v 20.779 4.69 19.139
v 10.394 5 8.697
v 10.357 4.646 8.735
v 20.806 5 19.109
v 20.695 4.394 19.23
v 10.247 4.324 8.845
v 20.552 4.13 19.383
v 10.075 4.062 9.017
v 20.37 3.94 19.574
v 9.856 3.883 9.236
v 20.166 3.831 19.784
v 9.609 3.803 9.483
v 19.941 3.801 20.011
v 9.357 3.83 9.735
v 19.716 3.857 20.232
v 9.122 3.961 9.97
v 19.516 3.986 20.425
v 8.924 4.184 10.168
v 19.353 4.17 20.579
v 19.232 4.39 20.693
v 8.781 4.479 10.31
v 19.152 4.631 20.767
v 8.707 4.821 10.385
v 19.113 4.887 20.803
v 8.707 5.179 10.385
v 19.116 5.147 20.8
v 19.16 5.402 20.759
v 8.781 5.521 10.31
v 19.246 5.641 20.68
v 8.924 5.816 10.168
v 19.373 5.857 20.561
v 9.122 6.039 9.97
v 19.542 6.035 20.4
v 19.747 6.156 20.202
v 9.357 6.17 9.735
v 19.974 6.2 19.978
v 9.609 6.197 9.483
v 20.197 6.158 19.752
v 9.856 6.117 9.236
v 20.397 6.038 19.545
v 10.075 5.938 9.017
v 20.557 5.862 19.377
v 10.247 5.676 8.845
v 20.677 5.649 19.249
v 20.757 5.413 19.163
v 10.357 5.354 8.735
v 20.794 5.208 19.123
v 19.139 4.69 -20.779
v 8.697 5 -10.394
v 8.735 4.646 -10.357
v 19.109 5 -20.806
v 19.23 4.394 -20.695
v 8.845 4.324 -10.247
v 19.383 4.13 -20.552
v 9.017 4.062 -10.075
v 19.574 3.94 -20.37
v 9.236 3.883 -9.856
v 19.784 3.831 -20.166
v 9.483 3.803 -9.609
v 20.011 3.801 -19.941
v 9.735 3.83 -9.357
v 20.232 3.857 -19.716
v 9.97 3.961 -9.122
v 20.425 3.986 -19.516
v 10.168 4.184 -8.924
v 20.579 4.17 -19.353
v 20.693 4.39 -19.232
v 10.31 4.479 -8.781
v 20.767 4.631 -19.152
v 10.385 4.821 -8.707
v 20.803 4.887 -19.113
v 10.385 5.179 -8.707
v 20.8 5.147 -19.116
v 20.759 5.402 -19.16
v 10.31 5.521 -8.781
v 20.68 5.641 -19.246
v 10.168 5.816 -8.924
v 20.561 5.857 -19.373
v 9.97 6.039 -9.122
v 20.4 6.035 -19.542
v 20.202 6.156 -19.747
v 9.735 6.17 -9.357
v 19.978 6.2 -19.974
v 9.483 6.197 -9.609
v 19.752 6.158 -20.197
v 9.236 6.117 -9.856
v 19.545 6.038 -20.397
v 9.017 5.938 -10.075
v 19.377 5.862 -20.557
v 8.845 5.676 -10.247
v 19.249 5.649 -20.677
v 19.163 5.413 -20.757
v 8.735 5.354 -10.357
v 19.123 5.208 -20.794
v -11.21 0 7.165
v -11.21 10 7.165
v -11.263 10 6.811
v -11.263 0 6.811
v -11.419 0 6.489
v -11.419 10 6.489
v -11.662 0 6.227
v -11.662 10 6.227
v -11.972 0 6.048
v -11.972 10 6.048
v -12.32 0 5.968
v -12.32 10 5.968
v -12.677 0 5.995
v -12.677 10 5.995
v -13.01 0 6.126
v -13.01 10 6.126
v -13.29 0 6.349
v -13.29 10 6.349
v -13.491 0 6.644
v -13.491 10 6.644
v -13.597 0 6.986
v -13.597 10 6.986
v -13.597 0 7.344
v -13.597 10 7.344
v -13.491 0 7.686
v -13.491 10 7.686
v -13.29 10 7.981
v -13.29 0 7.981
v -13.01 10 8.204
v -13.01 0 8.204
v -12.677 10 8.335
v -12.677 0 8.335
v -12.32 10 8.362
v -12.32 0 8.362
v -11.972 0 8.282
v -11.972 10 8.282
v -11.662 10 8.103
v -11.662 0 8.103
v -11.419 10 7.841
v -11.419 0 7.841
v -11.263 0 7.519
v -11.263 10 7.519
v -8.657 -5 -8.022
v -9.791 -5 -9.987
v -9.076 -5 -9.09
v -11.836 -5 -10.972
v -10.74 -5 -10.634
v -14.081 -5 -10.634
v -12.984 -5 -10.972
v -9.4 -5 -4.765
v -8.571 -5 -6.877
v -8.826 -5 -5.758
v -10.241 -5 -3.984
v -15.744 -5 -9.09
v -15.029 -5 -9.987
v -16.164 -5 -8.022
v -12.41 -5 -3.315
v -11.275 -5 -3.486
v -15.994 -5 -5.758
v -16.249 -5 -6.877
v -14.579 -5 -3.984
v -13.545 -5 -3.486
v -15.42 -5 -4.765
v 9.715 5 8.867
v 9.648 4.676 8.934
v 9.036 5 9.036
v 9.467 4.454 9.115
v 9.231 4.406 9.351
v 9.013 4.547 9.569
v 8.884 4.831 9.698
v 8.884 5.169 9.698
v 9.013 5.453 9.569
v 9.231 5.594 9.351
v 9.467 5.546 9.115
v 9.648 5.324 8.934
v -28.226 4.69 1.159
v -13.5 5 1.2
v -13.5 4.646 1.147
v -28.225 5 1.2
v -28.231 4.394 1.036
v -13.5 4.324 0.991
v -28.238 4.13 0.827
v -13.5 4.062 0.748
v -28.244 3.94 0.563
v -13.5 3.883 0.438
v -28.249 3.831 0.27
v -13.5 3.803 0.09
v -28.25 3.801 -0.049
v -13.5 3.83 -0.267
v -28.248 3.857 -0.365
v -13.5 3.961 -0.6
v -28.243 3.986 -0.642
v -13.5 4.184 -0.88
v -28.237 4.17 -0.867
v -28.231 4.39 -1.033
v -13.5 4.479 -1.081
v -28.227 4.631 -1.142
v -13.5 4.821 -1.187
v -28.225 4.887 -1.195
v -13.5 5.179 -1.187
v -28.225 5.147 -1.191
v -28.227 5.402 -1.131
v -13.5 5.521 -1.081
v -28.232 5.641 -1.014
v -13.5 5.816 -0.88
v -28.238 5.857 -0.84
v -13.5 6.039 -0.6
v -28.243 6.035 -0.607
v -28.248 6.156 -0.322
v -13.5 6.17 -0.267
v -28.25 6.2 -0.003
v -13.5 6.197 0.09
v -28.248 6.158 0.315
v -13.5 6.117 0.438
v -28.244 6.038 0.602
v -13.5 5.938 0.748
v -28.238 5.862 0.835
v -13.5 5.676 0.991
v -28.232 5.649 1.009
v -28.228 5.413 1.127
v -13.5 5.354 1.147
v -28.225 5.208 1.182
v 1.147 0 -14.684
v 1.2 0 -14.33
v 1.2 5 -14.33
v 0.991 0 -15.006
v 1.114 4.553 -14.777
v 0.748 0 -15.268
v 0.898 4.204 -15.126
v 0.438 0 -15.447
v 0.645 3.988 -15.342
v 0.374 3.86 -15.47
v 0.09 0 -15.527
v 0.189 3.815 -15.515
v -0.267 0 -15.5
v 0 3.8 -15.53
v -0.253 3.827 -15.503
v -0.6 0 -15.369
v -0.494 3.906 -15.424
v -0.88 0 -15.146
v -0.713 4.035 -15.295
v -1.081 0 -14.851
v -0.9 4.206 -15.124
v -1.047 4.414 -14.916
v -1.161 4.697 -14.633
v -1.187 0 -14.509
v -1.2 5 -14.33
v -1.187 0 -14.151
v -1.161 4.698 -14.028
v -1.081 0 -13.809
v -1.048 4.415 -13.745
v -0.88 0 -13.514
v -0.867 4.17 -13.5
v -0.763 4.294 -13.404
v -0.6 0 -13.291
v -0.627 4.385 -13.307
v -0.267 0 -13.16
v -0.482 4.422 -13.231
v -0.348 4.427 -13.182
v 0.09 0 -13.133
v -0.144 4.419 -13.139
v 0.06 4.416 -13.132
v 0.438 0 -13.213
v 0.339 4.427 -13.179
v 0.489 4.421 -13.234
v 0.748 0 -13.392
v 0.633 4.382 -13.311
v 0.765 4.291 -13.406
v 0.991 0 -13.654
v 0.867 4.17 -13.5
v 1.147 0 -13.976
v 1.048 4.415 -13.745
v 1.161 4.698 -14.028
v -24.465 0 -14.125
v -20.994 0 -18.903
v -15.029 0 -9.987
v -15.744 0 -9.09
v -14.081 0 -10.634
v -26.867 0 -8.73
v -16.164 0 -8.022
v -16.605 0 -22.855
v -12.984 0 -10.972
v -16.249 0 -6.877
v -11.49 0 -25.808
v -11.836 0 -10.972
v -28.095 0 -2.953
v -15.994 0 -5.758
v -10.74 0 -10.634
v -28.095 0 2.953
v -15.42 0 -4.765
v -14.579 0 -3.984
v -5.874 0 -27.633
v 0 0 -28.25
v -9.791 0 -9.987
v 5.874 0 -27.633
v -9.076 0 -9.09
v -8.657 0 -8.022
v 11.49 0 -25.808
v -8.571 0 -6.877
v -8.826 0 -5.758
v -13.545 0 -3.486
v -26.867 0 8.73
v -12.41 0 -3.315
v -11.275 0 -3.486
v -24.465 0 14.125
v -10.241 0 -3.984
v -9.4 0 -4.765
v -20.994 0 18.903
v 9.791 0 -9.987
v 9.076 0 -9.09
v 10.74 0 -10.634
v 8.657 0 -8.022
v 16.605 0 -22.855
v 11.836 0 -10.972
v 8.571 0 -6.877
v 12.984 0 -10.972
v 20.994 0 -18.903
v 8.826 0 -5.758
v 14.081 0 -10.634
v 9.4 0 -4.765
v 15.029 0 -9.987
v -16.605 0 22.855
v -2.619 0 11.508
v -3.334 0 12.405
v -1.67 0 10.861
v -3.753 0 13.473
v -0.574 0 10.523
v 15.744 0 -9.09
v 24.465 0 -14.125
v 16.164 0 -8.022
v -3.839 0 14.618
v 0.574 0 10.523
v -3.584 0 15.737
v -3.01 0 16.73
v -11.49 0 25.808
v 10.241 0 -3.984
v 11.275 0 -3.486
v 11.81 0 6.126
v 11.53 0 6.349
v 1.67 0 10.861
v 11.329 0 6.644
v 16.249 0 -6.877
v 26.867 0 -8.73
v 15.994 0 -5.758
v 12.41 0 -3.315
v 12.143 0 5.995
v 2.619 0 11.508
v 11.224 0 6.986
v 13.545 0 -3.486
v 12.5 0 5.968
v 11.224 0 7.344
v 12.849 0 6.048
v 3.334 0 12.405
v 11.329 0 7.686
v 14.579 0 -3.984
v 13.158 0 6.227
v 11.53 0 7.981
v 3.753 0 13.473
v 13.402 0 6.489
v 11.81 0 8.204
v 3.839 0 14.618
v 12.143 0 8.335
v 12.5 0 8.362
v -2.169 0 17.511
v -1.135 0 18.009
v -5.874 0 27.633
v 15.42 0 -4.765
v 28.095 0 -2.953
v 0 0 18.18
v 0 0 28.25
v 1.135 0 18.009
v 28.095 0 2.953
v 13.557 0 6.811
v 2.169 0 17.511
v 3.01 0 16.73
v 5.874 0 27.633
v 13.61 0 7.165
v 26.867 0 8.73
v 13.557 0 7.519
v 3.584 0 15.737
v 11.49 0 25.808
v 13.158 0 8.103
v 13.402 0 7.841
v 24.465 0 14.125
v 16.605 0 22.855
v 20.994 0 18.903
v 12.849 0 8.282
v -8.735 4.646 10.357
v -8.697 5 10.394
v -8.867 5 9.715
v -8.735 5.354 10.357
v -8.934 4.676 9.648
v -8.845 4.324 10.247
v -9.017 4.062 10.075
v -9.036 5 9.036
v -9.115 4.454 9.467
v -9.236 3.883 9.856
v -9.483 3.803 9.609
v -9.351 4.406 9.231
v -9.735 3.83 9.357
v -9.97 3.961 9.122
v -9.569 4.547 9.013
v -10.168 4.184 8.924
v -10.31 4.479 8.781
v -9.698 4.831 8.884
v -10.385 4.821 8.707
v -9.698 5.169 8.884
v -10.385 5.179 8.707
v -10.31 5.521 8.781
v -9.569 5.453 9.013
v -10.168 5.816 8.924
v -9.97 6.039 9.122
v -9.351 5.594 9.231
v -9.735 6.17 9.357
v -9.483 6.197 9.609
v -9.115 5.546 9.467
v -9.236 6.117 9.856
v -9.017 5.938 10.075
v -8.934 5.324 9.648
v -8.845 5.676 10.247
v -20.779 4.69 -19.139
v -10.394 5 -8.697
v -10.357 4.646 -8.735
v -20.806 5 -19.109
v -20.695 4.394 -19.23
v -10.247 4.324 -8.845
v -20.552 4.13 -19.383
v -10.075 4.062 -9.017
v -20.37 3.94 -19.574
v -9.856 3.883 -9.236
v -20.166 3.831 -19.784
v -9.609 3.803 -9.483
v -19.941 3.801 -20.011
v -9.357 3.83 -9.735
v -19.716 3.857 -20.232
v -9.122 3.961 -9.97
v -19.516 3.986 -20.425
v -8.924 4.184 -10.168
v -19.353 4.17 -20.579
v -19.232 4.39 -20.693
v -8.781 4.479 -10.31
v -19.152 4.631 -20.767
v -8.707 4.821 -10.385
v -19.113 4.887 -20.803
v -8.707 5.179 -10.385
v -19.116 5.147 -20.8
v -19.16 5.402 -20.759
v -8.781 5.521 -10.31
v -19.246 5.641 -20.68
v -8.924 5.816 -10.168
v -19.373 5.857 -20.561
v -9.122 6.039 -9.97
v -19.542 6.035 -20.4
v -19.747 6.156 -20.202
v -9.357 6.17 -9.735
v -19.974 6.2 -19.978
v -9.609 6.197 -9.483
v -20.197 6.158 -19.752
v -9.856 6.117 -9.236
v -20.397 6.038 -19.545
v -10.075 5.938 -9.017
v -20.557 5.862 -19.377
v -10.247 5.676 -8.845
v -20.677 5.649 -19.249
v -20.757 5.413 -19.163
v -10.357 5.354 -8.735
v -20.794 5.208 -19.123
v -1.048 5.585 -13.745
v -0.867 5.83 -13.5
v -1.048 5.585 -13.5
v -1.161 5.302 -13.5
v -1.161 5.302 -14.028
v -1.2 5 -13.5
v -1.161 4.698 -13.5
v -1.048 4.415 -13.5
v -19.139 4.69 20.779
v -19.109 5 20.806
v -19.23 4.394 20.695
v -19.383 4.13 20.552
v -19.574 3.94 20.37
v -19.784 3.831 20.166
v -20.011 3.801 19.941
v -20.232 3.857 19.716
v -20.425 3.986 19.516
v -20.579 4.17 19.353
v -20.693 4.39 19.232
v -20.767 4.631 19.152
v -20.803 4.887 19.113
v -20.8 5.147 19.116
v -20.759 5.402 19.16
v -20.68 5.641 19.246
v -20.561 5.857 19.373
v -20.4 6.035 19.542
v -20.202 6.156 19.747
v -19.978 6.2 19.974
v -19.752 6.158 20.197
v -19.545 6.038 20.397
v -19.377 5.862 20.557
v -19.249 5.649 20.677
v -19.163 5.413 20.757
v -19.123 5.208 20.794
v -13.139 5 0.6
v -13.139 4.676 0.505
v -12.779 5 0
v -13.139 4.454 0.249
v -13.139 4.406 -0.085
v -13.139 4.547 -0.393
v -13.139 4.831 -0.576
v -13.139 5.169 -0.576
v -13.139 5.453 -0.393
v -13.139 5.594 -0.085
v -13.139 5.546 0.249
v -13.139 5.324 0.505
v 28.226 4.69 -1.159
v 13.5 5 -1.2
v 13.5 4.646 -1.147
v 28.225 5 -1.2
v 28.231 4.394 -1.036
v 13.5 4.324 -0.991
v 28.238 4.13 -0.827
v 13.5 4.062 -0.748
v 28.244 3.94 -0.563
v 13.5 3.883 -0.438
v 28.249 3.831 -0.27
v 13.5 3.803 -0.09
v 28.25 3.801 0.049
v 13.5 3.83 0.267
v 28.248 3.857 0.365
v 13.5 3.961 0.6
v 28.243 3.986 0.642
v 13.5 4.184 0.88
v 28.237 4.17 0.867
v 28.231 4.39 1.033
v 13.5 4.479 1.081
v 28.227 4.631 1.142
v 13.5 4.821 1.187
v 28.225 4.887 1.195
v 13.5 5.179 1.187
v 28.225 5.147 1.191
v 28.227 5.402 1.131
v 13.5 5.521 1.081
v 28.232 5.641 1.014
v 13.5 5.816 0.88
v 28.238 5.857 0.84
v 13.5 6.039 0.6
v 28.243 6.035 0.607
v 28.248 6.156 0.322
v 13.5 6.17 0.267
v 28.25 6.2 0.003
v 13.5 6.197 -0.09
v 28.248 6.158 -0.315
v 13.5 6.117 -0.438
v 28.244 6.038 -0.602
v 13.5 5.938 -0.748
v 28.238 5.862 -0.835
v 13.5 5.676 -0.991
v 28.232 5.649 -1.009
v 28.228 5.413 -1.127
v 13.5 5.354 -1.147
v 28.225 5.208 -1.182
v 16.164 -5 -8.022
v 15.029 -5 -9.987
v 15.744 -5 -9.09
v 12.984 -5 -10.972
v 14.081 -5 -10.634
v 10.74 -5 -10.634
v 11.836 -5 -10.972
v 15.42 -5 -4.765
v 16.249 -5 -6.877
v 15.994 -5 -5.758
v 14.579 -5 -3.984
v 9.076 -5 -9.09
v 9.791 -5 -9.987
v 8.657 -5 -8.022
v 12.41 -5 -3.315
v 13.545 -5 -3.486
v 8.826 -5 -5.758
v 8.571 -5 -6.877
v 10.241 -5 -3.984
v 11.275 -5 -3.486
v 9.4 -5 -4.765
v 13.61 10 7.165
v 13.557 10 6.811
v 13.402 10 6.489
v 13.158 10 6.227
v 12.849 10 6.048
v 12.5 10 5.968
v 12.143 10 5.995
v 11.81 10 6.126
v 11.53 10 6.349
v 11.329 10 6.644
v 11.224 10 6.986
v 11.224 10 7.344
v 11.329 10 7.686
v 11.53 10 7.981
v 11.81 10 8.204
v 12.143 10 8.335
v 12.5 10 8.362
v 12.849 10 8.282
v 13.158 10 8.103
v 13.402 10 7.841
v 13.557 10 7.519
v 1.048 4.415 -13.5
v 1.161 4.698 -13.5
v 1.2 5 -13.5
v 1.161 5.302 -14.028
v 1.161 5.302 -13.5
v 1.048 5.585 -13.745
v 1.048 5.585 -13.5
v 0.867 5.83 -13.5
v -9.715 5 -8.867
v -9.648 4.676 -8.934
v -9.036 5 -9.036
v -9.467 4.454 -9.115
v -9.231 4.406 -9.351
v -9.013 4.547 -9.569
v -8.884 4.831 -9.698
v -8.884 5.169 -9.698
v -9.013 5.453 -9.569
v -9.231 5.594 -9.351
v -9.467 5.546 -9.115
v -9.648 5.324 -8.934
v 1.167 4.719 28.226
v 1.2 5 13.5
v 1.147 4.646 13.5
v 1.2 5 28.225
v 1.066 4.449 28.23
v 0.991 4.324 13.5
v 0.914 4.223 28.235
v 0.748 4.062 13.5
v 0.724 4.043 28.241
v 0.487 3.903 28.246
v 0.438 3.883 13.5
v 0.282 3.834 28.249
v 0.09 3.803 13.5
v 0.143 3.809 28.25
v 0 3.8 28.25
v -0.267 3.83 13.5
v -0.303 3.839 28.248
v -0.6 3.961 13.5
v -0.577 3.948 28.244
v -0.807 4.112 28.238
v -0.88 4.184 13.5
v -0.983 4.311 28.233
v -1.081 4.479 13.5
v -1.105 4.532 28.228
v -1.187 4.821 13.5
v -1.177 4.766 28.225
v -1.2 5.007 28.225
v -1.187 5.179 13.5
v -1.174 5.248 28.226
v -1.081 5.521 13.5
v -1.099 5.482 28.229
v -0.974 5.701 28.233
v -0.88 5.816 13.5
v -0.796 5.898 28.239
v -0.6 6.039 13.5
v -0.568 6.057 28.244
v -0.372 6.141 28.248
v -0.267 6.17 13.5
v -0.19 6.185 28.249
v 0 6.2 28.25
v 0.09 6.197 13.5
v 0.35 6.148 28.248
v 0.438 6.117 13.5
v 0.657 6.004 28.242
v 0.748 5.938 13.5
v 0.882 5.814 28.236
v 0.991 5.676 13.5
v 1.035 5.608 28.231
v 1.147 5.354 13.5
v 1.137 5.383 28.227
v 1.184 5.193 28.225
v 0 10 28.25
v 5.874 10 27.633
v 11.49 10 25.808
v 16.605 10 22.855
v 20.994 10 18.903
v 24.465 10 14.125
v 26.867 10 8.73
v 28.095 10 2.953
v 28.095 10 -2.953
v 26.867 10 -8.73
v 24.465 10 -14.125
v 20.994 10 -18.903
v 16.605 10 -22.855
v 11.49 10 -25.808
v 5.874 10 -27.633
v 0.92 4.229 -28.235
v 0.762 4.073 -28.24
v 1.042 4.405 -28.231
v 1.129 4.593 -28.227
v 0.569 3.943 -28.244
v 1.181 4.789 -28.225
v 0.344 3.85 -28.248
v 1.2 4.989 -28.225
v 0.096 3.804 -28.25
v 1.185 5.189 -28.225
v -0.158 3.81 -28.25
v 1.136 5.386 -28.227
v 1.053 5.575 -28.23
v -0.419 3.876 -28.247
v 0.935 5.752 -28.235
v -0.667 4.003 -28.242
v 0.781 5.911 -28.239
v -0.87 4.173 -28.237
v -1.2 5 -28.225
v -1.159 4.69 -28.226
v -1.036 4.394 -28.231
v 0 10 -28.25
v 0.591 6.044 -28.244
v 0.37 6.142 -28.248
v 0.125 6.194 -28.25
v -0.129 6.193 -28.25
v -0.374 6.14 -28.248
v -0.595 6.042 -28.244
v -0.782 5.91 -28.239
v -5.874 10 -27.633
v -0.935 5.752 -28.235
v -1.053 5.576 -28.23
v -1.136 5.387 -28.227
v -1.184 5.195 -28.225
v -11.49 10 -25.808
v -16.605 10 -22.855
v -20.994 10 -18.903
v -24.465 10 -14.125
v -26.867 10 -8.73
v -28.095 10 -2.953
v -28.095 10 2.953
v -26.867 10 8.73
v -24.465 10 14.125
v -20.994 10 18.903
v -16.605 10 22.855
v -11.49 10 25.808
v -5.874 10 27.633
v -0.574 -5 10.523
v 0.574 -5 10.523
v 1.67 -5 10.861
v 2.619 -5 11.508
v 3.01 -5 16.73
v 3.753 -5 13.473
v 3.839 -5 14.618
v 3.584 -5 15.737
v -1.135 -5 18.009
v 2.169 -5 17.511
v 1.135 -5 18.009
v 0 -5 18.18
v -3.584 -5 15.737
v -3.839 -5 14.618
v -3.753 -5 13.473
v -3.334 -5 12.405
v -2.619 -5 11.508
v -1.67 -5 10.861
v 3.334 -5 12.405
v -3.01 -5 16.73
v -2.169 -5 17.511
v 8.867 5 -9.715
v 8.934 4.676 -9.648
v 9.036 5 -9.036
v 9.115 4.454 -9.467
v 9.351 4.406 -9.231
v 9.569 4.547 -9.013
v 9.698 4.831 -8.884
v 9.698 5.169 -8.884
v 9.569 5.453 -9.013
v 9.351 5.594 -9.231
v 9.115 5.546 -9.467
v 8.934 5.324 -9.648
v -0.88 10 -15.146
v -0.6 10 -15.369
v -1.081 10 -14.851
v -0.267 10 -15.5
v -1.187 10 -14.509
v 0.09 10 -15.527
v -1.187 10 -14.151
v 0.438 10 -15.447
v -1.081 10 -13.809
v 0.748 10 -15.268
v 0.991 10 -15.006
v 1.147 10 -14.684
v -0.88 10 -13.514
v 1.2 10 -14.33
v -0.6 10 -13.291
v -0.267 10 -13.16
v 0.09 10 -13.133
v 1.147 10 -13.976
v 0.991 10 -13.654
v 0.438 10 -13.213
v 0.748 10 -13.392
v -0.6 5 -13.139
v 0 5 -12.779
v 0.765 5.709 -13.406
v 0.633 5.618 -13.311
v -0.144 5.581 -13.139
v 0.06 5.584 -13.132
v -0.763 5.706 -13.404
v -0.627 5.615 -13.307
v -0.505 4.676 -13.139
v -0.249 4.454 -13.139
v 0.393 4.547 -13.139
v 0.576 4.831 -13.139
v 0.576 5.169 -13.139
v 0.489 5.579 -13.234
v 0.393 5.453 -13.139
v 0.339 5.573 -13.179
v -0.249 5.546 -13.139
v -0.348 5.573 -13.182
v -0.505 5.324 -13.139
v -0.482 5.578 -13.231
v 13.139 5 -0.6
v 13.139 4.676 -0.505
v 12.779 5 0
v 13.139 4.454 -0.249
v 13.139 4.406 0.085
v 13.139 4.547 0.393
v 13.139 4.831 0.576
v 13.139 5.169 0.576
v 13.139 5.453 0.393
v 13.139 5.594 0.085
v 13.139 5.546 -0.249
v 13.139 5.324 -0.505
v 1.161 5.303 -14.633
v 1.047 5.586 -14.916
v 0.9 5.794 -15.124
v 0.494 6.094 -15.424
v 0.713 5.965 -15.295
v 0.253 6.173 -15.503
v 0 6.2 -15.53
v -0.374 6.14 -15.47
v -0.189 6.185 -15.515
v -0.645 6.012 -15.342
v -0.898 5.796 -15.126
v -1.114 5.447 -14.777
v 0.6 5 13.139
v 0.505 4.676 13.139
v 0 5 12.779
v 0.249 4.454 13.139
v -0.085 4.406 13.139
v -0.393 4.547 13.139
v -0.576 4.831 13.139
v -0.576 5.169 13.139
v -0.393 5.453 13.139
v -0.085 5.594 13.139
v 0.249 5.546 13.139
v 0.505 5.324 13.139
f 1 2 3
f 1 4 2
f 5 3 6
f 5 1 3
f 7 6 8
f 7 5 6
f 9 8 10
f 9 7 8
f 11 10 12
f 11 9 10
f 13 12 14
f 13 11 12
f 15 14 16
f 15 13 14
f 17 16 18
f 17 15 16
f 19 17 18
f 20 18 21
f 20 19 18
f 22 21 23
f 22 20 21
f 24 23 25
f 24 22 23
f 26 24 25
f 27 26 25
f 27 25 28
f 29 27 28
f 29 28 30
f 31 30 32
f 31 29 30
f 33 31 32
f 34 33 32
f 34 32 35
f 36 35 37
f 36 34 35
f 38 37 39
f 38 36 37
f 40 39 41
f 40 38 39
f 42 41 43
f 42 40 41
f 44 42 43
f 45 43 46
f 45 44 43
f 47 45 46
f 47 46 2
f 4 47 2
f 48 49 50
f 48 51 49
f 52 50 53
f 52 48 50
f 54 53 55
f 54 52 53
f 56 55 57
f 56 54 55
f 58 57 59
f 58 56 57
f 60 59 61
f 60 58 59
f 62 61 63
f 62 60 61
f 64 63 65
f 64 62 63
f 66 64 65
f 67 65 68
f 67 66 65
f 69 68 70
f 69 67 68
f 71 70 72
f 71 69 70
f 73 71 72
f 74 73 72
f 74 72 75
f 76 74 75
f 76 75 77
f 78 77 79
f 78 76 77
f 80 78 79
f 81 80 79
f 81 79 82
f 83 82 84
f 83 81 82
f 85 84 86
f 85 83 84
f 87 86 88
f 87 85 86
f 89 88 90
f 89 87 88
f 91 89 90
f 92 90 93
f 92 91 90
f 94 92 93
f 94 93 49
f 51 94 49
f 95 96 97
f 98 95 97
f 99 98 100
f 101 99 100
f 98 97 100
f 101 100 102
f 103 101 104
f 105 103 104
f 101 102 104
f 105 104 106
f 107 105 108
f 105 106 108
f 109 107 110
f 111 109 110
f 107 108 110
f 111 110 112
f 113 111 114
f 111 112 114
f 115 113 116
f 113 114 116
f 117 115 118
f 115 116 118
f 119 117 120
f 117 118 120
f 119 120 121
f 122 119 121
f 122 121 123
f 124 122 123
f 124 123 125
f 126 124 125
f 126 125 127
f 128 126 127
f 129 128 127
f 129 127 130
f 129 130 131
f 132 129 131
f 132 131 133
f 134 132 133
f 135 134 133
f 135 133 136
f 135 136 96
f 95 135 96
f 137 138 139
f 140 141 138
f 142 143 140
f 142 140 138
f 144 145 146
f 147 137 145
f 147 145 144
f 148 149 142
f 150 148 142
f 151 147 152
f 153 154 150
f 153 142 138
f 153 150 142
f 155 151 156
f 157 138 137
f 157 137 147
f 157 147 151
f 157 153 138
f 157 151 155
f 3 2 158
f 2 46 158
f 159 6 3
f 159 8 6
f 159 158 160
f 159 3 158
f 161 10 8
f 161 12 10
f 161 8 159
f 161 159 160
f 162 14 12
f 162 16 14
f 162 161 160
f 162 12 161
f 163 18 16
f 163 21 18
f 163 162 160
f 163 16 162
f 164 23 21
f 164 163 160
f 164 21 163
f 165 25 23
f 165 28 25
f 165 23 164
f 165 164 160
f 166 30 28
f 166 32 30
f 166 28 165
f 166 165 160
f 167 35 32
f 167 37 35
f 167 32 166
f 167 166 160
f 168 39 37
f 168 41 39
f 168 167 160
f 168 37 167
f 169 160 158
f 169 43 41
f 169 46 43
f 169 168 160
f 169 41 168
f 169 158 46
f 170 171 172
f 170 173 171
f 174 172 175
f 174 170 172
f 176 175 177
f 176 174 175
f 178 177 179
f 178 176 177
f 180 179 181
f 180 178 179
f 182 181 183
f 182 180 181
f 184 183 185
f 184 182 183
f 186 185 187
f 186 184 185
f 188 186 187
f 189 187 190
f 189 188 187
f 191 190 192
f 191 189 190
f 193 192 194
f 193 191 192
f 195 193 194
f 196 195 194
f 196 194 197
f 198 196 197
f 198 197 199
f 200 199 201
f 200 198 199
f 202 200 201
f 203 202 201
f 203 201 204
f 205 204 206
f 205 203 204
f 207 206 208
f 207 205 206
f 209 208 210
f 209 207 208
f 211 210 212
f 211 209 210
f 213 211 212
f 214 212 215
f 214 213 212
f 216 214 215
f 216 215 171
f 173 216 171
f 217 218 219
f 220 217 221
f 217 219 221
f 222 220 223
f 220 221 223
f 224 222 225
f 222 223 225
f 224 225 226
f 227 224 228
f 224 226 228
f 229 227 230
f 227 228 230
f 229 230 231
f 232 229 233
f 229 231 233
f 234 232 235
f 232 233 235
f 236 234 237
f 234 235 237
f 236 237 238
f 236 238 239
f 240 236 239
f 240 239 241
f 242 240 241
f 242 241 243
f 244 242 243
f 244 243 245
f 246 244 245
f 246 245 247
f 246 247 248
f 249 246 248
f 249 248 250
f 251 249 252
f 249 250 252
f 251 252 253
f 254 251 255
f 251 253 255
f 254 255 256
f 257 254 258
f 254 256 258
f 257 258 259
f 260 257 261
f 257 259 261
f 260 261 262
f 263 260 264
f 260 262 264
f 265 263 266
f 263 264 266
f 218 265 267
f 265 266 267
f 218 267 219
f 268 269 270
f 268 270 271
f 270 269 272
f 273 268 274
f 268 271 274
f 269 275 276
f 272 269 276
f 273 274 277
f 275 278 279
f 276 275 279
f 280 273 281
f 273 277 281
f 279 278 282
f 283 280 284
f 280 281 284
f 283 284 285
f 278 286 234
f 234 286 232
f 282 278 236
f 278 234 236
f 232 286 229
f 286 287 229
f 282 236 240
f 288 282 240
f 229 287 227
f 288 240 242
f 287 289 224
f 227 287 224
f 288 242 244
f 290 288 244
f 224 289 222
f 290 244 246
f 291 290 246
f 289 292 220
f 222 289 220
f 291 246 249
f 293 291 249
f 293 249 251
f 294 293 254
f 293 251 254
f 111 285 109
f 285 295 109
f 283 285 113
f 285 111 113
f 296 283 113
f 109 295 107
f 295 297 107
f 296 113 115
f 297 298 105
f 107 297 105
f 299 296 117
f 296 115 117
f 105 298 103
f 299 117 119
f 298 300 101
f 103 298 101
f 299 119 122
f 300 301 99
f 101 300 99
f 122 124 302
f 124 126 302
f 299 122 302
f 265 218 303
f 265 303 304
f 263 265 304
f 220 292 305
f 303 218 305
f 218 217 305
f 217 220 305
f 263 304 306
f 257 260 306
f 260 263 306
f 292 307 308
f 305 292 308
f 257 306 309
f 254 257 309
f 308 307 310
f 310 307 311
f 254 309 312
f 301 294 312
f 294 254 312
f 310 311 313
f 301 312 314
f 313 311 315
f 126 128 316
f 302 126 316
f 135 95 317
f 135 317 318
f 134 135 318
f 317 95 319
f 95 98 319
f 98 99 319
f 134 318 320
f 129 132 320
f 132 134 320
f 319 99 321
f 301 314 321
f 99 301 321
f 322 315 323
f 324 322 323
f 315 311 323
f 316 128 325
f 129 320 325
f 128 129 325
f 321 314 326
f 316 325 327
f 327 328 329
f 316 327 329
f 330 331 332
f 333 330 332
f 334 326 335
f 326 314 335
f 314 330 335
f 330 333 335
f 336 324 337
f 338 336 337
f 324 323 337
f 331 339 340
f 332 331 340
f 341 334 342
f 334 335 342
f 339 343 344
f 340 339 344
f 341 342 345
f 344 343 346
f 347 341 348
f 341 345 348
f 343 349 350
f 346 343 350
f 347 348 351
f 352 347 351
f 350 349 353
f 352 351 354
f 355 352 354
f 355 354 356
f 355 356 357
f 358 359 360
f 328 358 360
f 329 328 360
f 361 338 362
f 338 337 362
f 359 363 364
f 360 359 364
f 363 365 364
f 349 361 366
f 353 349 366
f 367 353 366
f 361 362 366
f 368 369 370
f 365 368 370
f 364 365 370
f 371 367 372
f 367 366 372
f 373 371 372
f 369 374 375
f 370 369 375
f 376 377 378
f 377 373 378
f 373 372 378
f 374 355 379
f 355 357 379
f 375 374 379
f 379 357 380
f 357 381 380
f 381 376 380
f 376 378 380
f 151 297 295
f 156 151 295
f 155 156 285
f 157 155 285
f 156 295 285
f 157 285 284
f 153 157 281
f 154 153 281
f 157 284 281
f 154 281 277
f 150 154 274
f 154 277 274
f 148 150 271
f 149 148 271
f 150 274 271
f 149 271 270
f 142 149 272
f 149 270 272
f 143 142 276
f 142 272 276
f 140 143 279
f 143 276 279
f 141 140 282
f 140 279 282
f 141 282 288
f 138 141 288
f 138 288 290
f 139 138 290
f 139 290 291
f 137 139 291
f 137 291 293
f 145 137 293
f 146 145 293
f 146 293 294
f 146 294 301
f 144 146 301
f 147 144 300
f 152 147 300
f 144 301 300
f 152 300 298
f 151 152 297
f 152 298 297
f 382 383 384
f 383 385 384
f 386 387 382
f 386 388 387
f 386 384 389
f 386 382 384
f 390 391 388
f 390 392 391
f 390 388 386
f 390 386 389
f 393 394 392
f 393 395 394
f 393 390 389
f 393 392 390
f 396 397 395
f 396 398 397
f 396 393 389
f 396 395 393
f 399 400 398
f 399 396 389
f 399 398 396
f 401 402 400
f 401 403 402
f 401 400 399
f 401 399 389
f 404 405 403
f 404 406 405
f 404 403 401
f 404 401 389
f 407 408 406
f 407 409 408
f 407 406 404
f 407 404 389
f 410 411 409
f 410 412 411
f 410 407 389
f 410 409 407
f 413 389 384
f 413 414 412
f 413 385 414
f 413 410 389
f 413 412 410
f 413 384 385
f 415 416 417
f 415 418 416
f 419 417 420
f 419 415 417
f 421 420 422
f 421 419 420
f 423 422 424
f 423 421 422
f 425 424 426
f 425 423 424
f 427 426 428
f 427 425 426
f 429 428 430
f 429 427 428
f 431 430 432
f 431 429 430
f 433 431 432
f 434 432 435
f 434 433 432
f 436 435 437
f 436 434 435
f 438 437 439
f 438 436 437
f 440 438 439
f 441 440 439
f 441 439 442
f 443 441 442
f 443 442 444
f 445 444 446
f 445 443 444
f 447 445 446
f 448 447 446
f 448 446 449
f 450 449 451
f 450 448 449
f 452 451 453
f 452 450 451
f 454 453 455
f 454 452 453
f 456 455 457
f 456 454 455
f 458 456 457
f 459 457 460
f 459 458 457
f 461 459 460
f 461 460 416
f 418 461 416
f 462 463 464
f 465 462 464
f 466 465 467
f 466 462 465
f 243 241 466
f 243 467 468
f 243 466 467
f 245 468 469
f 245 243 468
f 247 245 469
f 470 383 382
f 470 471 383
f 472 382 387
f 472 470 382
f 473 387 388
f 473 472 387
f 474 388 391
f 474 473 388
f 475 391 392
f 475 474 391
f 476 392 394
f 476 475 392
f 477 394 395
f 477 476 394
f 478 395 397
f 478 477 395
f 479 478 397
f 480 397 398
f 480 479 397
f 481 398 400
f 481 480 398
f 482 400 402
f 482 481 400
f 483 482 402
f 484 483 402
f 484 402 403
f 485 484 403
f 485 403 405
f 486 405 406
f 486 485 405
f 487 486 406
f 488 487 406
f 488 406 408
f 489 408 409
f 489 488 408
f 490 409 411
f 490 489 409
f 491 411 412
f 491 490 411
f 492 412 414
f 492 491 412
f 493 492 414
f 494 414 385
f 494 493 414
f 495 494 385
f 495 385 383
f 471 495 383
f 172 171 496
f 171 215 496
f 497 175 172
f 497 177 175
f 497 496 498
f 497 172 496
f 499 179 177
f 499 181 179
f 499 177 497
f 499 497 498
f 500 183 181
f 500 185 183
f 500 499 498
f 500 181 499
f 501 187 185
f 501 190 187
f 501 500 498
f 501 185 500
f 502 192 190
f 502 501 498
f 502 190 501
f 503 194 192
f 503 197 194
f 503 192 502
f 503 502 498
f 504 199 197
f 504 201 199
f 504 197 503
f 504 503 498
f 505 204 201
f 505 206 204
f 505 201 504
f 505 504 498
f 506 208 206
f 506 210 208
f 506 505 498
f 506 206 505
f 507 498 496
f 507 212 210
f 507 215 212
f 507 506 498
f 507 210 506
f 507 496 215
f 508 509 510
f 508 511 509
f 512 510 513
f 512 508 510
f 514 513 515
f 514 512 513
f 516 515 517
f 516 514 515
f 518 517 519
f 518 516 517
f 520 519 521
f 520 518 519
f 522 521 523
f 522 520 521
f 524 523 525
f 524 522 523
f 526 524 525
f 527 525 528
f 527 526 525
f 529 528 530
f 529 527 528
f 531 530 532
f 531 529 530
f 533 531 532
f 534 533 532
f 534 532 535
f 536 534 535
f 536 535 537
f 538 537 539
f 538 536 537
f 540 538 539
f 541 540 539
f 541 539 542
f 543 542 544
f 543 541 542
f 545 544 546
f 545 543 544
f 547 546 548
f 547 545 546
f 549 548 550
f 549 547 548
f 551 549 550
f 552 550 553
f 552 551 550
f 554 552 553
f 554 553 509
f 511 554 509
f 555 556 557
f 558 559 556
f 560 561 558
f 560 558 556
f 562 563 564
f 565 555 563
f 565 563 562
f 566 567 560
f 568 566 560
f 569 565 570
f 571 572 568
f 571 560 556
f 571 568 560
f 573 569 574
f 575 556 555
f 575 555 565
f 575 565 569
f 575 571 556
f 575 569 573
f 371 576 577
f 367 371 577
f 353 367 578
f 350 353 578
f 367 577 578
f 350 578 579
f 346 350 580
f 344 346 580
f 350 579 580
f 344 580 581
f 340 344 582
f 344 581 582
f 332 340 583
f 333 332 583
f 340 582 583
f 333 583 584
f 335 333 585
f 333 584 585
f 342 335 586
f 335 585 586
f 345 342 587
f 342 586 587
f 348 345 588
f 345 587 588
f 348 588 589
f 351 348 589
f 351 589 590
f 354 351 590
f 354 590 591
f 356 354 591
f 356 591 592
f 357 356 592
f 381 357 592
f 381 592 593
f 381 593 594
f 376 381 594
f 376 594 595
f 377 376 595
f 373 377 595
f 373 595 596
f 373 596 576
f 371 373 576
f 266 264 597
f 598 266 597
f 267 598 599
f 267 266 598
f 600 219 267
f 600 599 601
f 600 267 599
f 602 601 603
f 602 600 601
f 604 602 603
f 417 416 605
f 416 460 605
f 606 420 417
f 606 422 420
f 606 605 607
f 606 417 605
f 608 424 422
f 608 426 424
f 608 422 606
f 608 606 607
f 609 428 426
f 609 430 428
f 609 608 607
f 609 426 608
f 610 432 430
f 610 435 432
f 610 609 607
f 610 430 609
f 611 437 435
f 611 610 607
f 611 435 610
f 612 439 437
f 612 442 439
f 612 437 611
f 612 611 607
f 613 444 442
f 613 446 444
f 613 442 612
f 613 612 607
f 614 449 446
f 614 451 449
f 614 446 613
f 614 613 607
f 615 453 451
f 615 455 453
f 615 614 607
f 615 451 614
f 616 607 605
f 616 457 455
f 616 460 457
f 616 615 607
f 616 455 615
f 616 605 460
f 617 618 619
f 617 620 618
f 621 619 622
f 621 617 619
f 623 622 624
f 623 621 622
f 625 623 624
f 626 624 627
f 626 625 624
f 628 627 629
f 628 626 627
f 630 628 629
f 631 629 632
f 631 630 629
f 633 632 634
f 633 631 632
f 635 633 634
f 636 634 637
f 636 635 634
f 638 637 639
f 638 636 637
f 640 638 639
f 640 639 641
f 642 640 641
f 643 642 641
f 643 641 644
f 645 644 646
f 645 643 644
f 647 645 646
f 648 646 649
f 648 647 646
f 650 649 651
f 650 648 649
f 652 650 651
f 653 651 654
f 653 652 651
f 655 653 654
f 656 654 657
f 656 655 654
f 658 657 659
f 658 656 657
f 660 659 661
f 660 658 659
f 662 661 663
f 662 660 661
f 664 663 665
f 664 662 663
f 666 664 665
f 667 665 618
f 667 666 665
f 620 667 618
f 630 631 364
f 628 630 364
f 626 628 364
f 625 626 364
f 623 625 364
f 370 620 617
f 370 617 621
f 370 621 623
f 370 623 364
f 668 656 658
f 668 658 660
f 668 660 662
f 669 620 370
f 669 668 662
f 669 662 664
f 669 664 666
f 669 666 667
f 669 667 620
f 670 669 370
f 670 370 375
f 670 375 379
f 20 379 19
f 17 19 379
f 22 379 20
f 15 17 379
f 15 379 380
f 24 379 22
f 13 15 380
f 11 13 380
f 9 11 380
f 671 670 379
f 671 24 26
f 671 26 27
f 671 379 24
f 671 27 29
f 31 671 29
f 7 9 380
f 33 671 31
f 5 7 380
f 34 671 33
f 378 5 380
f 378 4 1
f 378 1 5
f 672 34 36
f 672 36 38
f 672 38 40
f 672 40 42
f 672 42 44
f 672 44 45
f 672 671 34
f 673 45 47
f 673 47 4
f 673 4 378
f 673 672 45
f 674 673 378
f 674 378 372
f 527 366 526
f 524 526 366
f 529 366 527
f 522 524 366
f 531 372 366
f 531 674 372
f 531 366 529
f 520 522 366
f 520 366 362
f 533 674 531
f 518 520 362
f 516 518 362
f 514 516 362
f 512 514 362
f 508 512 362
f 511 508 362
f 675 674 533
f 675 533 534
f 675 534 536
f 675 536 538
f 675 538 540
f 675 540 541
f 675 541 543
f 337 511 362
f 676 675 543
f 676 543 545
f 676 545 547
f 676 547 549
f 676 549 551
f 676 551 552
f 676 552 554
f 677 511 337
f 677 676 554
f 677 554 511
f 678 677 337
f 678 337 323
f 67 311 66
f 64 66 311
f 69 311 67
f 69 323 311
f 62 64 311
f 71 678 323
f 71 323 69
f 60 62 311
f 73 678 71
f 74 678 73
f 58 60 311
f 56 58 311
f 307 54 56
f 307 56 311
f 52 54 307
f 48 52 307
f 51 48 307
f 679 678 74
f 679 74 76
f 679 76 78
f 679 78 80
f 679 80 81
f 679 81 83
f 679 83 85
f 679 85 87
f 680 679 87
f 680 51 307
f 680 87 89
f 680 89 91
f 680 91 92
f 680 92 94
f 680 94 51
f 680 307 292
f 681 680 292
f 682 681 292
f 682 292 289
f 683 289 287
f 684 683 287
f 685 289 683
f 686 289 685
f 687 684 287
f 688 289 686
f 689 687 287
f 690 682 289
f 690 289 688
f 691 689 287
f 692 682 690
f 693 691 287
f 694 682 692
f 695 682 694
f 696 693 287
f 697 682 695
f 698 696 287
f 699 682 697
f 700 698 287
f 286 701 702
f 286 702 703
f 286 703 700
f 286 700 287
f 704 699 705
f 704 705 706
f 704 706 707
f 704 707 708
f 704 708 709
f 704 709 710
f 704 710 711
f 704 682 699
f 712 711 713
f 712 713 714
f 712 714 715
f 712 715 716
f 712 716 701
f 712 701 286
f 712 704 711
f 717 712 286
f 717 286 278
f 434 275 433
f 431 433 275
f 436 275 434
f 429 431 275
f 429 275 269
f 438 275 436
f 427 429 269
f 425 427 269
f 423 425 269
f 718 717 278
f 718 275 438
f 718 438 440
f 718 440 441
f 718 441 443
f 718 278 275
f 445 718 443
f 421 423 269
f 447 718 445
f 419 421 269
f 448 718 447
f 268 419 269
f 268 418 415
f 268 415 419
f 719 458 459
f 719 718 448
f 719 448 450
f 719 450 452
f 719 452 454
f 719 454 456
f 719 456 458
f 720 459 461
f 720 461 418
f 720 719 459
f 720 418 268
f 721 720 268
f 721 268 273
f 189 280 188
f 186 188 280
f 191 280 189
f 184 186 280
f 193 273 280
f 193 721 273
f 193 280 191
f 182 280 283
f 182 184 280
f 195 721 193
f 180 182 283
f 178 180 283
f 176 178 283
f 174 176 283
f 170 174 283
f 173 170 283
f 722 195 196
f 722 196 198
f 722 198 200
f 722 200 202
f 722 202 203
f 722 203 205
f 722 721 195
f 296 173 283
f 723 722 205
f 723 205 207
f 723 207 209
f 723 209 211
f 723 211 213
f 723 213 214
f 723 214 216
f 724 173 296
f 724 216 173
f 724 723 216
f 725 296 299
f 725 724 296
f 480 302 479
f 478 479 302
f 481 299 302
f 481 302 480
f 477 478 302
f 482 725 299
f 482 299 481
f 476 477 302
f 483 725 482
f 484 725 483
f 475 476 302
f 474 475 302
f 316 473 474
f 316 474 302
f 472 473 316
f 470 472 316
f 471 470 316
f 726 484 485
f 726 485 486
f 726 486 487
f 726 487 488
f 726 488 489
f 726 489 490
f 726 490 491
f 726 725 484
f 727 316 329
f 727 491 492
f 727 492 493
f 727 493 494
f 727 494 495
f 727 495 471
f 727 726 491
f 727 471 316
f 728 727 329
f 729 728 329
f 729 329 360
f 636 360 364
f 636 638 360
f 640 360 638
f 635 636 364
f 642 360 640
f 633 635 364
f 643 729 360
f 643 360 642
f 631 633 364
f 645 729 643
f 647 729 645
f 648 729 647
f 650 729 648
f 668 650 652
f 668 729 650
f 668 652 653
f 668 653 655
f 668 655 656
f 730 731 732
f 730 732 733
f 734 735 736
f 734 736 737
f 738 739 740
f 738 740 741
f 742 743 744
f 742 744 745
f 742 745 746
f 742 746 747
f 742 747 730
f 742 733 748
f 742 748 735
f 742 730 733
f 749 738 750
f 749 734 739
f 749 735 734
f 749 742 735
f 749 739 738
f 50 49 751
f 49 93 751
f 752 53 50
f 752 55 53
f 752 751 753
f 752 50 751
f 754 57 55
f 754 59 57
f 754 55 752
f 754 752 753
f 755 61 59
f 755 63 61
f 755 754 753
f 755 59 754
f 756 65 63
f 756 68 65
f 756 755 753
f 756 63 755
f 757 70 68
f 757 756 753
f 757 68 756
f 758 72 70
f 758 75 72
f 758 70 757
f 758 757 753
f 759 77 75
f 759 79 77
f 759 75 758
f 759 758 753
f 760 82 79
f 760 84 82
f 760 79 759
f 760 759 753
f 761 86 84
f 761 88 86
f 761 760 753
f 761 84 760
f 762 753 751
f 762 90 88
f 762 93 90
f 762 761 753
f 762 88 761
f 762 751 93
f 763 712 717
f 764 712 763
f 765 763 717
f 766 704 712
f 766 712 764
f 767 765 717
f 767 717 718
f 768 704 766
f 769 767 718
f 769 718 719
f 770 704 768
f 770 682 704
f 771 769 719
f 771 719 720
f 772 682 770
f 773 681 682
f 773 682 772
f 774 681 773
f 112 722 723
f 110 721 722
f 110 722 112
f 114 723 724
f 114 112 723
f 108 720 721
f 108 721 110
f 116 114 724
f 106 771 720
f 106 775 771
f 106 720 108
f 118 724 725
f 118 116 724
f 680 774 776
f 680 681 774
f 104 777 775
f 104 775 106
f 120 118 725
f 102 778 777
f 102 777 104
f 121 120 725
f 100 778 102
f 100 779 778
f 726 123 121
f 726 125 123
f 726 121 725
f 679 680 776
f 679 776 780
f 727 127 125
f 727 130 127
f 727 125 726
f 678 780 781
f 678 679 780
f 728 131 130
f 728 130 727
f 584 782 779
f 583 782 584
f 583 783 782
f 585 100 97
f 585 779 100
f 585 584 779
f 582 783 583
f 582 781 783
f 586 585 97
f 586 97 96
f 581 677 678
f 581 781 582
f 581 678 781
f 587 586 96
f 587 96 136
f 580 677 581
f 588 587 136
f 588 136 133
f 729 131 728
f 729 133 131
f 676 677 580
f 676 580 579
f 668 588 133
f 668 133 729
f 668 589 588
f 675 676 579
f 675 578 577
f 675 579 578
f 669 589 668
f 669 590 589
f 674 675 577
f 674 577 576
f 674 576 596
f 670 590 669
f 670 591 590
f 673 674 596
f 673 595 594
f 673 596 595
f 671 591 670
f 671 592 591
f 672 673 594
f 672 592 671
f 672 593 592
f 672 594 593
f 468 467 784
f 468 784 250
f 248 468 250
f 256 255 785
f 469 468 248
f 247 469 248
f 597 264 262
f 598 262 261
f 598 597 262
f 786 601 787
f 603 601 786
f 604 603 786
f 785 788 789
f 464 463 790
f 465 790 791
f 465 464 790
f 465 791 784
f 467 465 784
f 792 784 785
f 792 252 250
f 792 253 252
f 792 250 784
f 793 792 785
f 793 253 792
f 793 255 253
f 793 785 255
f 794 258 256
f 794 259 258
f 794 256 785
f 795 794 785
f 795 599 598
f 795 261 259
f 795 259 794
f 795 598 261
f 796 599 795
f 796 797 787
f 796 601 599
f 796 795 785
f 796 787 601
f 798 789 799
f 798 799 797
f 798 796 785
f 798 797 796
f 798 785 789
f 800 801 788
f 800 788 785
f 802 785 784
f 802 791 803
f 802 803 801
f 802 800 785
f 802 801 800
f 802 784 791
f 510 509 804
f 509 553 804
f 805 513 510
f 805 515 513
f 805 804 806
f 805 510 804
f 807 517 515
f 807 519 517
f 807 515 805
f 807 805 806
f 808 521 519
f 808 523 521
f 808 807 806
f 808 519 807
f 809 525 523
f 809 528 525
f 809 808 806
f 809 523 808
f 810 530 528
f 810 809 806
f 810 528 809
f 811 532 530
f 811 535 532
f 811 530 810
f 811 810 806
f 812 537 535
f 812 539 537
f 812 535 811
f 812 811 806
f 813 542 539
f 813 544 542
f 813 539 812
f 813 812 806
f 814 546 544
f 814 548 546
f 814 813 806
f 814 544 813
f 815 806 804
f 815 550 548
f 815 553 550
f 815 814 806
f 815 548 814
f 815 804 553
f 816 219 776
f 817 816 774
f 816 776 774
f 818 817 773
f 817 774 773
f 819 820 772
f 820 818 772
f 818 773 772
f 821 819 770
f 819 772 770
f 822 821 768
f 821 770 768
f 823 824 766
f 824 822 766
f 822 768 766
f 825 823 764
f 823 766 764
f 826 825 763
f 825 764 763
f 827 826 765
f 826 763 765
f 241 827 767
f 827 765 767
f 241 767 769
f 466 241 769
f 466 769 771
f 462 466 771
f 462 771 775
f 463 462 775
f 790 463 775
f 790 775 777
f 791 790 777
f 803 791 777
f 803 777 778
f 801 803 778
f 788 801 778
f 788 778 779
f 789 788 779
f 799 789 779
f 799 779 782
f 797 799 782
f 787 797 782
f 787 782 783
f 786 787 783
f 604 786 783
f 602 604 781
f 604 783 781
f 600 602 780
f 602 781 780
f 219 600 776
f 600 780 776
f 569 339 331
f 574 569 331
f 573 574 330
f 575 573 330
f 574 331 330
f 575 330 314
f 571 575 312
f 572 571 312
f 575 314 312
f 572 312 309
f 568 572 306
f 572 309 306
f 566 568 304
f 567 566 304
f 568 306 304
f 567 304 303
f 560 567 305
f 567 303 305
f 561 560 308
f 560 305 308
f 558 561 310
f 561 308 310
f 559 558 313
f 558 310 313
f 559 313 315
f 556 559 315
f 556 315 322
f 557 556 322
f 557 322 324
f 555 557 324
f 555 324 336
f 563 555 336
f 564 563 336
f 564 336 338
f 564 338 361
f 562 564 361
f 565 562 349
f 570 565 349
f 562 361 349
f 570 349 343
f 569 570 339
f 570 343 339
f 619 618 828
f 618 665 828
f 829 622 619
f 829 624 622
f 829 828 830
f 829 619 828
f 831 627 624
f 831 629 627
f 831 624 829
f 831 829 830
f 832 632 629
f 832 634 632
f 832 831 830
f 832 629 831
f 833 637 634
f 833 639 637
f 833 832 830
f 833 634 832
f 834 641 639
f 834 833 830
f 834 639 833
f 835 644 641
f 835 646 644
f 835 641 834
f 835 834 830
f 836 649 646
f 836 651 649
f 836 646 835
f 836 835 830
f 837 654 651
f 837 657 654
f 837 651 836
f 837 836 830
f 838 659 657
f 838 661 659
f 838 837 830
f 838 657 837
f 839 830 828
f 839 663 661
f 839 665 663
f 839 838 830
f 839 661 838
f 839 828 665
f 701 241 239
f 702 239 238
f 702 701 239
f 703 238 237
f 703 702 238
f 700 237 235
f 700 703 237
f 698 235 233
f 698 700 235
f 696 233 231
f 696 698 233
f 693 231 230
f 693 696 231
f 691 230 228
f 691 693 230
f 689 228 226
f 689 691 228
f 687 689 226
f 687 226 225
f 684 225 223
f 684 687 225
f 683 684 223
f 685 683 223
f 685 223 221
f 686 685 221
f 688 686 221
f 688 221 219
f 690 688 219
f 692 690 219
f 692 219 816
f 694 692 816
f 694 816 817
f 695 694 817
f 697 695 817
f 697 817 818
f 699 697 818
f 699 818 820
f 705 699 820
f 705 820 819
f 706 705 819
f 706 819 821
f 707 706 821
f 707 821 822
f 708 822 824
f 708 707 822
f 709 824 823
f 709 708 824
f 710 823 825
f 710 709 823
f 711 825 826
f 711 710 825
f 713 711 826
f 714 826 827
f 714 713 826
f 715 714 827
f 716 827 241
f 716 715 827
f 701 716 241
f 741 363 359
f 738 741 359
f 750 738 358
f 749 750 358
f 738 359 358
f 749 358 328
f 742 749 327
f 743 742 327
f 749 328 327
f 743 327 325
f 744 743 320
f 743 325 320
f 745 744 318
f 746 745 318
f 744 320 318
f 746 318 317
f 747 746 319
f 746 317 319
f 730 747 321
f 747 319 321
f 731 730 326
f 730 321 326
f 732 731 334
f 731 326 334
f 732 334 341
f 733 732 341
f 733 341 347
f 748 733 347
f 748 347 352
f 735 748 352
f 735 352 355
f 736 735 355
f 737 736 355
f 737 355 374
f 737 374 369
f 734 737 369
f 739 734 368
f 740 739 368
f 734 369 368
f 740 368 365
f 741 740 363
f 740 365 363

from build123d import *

# Parameters (mm, degrees)
SKETCH_1_R               = 28.5
EXTRUDE_1_DEPTH          = 10
SKETCH_36_R              = 3.85
EXTRUDE_5_DEPTH          = 5
PATTERN_CIRCULAR_4_COUNT = 8
SKETCH_42_R              = 39.215237935
SKETCH_42_R_2            = 28.25
CUT_EXTRUDE_1_DEPTH      = 44.005813698
HOLE_WIZARD_M2_3_D       = 2.4


with BuildPart() as part:
    # 스케치1 → 보스-돌출1 (new body)
    with BuildSketch(Plane(origin=(0, 0, 0), x_dir=(1, 0, 0), z_dir=(0, 1, 0))):
        with Locations(Location((0, 0, 0), (0, 0, 270))):
            Circle(SKETCH_1_R)
    extrude(amount=EXTRUDE_1_DEPTH)

    # 스케치36 → 보스-돌출5 (add)
    with BuildSketch(Plane.XZ):
        with Locations(Location((0, 14.33, 0), (0, 0, 90))):
            Circle(SKETCH_36_R)
        with Locations(Location((12.410144036, -7.165, 0), (0, 0, 90))):
            Circle(SKETCH_36_R)
        with Locations(Location((-12.410144036, -7.165, 0), (0, 0, 90))):
            Circle(SKETCH_36_R)
    extrude(amount=EXTRUDE_5_DEPTH)

    # 스케치41 → M2 여유 구멍1 (revolve, cut)
    with BuildSketch(Plane(origin=(-28.5, 5, 0), x_dir=(0, 0, 1), z_dir=(0, 1, 0))):
        Polygon((0, 0), (0, 15.721032743), (1.2, 15), (1.2, 0), align=None)
    hole_wizard_m2_1 = revolve(axis=Axis((-34.85, 5, 0), (1, 0, 0)), mode=Mode.SUBTRACT)

    # 원형 패턴4: M2 여유 구멍1 ×8 about axis
    pattern_circular_4_axis = Axis((0, 10, 0), (0, 1, 0))
    for i in range(1, PATTERN_CIRCULAR_4_COUNT):
        add(hole_wizard_m2_1.rotate(pattern_circular_4_axis, i * 360 / PATTERN_CIRCULAR_4_COUNT), mode=Mode.SUBTRACT)

    # 스케치42 → 컷-돌출1 (cut, through all)
    with BuildSketch(Plane(origin=(0, 10, 0), x_dir=(1, 0, 0), z_dir=(0, 1, 0))):
        Circle(SKETCH_42_R)
        with Locations(Location((0, 0, 0), (0, 0, 270))):
            Circle(SKETCH_42_R_2, mode=Mode.SUBTRACT)
    extrude(amount=-CUT_EXTRUDE_1_DEPTH, mode=Mode.SUBTRACT)

    # M2 여유 구멍3 (through all)
    with Locations(Plane(origin=(0, 0, 0), x_dir=(-1, 0, 0), z_dir=(0, -1, 0))):
        with Locations((-12.410144036, -7.165), (0, 14.33), (12.410144036, -7.165)):
            Hole(HOLE_WIZARD_M2_3_D / 2)


solid = part.part
